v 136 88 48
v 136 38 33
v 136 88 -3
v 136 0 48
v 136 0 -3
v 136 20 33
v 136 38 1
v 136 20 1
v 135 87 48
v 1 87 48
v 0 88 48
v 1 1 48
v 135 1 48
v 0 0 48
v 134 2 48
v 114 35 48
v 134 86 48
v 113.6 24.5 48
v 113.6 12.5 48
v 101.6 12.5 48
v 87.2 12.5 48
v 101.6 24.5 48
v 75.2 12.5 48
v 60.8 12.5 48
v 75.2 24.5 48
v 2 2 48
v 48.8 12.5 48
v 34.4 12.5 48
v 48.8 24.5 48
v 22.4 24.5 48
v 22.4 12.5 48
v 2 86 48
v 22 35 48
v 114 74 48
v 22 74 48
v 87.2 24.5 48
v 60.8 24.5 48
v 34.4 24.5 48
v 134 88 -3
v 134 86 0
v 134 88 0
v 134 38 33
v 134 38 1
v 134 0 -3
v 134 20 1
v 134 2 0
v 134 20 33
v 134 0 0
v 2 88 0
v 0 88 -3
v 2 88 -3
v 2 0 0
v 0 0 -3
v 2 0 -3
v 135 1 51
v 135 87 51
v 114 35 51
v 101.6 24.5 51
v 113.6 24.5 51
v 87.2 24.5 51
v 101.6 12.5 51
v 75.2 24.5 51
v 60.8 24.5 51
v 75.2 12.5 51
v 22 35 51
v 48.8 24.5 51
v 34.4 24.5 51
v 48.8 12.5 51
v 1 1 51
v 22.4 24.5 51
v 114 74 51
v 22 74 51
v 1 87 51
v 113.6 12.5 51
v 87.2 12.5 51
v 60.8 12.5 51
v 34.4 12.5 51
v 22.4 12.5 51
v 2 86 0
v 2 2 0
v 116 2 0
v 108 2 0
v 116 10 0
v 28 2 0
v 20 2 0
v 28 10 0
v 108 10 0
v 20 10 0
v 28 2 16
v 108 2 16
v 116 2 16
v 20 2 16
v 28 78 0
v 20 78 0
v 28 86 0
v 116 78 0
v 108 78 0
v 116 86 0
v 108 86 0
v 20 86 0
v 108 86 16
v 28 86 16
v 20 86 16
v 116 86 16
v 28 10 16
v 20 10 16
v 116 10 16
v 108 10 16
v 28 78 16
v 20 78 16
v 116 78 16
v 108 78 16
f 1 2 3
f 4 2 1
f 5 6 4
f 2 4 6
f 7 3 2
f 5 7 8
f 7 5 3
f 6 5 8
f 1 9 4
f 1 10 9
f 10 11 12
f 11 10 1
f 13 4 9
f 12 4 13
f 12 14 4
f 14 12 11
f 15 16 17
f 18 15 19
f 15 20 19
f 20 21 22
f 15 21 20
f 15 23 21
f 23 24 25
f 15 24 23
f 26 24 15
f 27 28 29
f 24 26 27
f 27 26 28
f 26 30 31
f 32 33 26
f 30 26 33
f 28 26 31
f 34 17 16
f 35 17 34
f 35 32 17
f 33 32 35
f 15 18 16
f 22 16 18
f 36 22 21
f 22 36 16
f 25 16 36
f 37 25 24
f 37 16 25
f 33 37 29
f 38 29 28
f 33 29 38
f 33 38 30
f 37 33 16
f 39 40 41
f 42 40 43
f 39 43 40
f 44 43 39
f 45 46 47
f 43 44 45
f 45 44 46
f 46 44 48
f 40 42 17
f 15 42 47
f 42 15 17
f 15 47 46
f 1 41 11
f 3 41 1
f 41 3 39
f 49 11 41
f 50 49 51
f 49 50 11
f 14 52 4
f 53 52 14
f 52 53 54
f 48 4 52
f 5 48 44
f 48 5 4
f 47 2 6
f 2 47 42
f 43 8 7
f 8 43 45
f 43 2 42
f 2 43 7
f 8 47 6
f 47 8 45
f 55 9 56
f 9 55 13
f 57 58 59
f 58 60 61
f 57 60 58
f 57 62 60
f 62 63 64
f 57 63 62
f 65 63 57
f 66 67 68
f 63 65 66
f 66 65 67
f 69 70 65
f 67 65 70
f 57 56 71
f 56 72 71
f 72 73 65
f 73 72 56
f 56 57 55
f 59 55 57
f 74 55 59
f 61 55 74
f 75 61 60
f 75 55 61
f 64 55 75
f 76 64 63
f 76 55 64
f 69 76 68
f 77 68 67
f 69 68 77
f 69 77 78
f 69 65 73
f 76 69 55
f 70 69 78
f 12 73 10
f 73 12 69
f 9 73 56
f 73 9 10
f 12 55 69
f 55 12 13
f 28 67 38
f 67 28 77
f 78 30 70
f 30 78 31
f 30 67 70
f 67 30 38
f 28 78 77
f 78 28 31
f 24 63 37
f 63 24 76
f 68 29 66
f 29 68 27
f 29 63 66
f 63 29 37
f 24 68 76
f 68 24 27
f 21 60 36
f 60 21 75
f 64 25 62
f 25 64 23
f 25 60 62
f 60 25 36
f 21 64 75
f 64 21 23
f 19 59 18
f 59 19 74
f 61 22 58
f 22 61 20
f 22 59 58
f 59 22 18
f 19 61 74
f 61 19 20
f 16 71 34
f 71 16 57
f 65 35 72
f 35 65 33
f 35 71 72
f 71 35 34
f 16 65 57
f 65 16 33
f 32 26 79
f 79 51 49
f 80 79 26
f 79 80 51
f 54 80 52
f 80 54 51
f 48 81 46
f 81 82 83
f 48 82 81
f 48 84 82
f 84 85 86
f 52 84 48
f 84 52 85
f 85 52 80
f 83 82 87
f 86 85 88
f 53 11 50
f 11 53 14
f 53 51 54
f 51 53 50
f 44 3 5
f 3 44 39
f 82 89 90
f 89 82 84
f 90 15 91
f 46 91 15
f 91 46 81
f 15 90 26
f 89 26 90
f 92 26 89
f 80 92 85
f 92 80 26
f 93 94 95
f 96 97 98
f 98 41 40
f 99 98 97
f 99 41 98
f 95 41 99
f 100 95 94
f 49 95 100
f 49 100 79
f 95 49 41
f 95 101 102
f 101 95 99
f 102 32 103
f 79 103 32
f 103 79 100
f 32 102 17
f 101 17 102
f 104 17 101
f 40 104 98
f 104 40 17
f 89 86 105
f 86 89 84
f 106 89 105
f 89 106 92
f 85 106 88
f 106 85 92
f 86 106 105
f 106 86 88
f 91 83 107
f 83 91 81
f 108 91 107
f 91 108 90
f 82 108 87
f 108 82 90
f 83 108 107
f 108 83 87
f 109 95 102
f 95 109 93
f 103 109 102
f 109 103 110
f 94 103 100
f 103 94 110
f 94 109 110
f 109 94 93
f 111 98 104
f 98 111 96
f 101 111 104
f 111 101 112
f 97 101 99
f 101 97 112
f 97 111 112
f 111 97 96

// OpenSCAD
// Set basic attributes
wallThickness = 2;
lidThickness = 3;
boxLengthInner = 132; 
boxWidthInner = 84;
boxHeightInner = 48;
screwFixingWidth = 8;
lipDepth = 3;
lcdHoleLength =92;
lcdHoleWidth = 39;
buttonWidth = 12;

// Some compound variables that are complicated enough
// to warrant their own variable
distanceOfButtonsFromEdge = (boxWidthInner-lcdHoleWidth-14-(buttonWidth/2))/2-wallThickness;


// Create one of the ends
cube([wallThickness,boxWidthInner+(wallThickness*2),boxHeightInner]);



// Create the lips the 2 ends need for the wooden base to butt up to
translate([0,0,-lipDepth])
    cube([wallThickness,boxWidthInner+(wallThickness*2),lipDepth]);
    
translate([0,0,-lipDepth])
    translate([boxLengthInner+wallThickness,0,0])
        cube([wallThickness,boxWidthInner+(wallThickness*2),lipDepth]);



// Create the 2 sides
translate([wallThickness, 0, 0]) cube([boxLengthInner,wallThickness,boxHeightInner]);
translate([wallThickness,boxWidthInner+wallThickness,0]) cube([boxLengthInner,wallThickness,boxHeightInner]);



// Create the screw fixings for the base. Initial translate(...) used to move the cursor inside the box
translate([wallThickness,wallThickness,0])
    translate([boxLengthInner/6 - (screwFixingWidth/2),0,0])
        cube([screwFixingWidth,screwFixingWidth,boxHeightInner / 3]);
        
translate([wallThickness,wallThickness,0]) 
    translate([((boxLengthInner/6*5) - (screwFixingWidth/2)),0,0])
        cube([screwFixingWidth,screwFixingWidth,boxHeightInner / 3]);
        
        
translate([wallThickness,wallThickness,0])
    translate([boxLengthInner/6-(screwFixingWidth/2),boxWidthInner-screwFixingWidth,0])
        cube([screwFixingWidth,screwFixingWidth,boxHeightInner / 3]);

translate([wallThickness,wallThickness,0])
    translate([((boxLengthInner/6*5) - (screwFixingWidth/2)),boxWidthInner-screwFixingWidth,0])
        cube([screwFixingWidth,screwFixingWidth,boxHeightInner / 3]);


// Create the other end, with a for the sockets to fit through
difference() {
translate([boxLengthInner+wallThickness,0,0])
    cube([wallThickness,boxWidthInner+(wallThickness*2),boxHeightInner]);
    
translate([boxLengthInner+wallThickness - 10,20,1]) // Doesn't matter about x dimensions very much
    cube([20,18,32]);
}



// Create the lid with holes cut out for the buttons and LCD.
difference() {
    difference() {
        difference() {
            difference() {
                difference() {
                    translate([wallThickness/2,wallThickness/2,boxHeightInner])
                        cube([boxLengthInner+(2*(wallThickness/2)),boxWidthInner+(2 * (wallThickness/2)),lidThickness]);
                    
                    translate([wallThickness,wallThickness,0]) 
                        translate([boxLengthInner/5-(buttonWidth/2),distanceOfButtonsFromEdge,boxHeightInner - 10])
                            cube([buttonWidth,buttonWidth,40]);
                };
                
                translate([wallThickness,wallThickness,0]) 
                    translate([(boxLengthInner/5)*2-(buttonWidth/2),distanceOfButtonsFromEdge,boxHeightInner - 10])
                        cube([buttonWidth,buttonWidth,40]);
            };
            
            translate([wallThickness,wallThickness,0]) 
                translate([(boxLengthInner/5)*3-(buttonWidth/2),distanceOfButtonsFromEdge,boxHeightInner - 10])
                    cube([buttonWidth,buttonWidth,40]);
        };
        
        translate([wallThickness,wallThickness,0])
            translate([boxLengthInner-(boxLengthInner/5)-(buttonWidth/2),distanceOfButtonsFromEdge,boxHeightInner - 10])
                cube([buttonWidth,buttonWidth,40]);
        
    };
    
    translate([wallThickness,wallThickness,0])
        translate([(boxLengthInner/2)-(lcdHoleLength/2),boxWidthInner-lcdHoleWidth-12,boxHeightInner - 10])
            cube([lcdHoleLength,lcdHoleWidth,40]);
}
